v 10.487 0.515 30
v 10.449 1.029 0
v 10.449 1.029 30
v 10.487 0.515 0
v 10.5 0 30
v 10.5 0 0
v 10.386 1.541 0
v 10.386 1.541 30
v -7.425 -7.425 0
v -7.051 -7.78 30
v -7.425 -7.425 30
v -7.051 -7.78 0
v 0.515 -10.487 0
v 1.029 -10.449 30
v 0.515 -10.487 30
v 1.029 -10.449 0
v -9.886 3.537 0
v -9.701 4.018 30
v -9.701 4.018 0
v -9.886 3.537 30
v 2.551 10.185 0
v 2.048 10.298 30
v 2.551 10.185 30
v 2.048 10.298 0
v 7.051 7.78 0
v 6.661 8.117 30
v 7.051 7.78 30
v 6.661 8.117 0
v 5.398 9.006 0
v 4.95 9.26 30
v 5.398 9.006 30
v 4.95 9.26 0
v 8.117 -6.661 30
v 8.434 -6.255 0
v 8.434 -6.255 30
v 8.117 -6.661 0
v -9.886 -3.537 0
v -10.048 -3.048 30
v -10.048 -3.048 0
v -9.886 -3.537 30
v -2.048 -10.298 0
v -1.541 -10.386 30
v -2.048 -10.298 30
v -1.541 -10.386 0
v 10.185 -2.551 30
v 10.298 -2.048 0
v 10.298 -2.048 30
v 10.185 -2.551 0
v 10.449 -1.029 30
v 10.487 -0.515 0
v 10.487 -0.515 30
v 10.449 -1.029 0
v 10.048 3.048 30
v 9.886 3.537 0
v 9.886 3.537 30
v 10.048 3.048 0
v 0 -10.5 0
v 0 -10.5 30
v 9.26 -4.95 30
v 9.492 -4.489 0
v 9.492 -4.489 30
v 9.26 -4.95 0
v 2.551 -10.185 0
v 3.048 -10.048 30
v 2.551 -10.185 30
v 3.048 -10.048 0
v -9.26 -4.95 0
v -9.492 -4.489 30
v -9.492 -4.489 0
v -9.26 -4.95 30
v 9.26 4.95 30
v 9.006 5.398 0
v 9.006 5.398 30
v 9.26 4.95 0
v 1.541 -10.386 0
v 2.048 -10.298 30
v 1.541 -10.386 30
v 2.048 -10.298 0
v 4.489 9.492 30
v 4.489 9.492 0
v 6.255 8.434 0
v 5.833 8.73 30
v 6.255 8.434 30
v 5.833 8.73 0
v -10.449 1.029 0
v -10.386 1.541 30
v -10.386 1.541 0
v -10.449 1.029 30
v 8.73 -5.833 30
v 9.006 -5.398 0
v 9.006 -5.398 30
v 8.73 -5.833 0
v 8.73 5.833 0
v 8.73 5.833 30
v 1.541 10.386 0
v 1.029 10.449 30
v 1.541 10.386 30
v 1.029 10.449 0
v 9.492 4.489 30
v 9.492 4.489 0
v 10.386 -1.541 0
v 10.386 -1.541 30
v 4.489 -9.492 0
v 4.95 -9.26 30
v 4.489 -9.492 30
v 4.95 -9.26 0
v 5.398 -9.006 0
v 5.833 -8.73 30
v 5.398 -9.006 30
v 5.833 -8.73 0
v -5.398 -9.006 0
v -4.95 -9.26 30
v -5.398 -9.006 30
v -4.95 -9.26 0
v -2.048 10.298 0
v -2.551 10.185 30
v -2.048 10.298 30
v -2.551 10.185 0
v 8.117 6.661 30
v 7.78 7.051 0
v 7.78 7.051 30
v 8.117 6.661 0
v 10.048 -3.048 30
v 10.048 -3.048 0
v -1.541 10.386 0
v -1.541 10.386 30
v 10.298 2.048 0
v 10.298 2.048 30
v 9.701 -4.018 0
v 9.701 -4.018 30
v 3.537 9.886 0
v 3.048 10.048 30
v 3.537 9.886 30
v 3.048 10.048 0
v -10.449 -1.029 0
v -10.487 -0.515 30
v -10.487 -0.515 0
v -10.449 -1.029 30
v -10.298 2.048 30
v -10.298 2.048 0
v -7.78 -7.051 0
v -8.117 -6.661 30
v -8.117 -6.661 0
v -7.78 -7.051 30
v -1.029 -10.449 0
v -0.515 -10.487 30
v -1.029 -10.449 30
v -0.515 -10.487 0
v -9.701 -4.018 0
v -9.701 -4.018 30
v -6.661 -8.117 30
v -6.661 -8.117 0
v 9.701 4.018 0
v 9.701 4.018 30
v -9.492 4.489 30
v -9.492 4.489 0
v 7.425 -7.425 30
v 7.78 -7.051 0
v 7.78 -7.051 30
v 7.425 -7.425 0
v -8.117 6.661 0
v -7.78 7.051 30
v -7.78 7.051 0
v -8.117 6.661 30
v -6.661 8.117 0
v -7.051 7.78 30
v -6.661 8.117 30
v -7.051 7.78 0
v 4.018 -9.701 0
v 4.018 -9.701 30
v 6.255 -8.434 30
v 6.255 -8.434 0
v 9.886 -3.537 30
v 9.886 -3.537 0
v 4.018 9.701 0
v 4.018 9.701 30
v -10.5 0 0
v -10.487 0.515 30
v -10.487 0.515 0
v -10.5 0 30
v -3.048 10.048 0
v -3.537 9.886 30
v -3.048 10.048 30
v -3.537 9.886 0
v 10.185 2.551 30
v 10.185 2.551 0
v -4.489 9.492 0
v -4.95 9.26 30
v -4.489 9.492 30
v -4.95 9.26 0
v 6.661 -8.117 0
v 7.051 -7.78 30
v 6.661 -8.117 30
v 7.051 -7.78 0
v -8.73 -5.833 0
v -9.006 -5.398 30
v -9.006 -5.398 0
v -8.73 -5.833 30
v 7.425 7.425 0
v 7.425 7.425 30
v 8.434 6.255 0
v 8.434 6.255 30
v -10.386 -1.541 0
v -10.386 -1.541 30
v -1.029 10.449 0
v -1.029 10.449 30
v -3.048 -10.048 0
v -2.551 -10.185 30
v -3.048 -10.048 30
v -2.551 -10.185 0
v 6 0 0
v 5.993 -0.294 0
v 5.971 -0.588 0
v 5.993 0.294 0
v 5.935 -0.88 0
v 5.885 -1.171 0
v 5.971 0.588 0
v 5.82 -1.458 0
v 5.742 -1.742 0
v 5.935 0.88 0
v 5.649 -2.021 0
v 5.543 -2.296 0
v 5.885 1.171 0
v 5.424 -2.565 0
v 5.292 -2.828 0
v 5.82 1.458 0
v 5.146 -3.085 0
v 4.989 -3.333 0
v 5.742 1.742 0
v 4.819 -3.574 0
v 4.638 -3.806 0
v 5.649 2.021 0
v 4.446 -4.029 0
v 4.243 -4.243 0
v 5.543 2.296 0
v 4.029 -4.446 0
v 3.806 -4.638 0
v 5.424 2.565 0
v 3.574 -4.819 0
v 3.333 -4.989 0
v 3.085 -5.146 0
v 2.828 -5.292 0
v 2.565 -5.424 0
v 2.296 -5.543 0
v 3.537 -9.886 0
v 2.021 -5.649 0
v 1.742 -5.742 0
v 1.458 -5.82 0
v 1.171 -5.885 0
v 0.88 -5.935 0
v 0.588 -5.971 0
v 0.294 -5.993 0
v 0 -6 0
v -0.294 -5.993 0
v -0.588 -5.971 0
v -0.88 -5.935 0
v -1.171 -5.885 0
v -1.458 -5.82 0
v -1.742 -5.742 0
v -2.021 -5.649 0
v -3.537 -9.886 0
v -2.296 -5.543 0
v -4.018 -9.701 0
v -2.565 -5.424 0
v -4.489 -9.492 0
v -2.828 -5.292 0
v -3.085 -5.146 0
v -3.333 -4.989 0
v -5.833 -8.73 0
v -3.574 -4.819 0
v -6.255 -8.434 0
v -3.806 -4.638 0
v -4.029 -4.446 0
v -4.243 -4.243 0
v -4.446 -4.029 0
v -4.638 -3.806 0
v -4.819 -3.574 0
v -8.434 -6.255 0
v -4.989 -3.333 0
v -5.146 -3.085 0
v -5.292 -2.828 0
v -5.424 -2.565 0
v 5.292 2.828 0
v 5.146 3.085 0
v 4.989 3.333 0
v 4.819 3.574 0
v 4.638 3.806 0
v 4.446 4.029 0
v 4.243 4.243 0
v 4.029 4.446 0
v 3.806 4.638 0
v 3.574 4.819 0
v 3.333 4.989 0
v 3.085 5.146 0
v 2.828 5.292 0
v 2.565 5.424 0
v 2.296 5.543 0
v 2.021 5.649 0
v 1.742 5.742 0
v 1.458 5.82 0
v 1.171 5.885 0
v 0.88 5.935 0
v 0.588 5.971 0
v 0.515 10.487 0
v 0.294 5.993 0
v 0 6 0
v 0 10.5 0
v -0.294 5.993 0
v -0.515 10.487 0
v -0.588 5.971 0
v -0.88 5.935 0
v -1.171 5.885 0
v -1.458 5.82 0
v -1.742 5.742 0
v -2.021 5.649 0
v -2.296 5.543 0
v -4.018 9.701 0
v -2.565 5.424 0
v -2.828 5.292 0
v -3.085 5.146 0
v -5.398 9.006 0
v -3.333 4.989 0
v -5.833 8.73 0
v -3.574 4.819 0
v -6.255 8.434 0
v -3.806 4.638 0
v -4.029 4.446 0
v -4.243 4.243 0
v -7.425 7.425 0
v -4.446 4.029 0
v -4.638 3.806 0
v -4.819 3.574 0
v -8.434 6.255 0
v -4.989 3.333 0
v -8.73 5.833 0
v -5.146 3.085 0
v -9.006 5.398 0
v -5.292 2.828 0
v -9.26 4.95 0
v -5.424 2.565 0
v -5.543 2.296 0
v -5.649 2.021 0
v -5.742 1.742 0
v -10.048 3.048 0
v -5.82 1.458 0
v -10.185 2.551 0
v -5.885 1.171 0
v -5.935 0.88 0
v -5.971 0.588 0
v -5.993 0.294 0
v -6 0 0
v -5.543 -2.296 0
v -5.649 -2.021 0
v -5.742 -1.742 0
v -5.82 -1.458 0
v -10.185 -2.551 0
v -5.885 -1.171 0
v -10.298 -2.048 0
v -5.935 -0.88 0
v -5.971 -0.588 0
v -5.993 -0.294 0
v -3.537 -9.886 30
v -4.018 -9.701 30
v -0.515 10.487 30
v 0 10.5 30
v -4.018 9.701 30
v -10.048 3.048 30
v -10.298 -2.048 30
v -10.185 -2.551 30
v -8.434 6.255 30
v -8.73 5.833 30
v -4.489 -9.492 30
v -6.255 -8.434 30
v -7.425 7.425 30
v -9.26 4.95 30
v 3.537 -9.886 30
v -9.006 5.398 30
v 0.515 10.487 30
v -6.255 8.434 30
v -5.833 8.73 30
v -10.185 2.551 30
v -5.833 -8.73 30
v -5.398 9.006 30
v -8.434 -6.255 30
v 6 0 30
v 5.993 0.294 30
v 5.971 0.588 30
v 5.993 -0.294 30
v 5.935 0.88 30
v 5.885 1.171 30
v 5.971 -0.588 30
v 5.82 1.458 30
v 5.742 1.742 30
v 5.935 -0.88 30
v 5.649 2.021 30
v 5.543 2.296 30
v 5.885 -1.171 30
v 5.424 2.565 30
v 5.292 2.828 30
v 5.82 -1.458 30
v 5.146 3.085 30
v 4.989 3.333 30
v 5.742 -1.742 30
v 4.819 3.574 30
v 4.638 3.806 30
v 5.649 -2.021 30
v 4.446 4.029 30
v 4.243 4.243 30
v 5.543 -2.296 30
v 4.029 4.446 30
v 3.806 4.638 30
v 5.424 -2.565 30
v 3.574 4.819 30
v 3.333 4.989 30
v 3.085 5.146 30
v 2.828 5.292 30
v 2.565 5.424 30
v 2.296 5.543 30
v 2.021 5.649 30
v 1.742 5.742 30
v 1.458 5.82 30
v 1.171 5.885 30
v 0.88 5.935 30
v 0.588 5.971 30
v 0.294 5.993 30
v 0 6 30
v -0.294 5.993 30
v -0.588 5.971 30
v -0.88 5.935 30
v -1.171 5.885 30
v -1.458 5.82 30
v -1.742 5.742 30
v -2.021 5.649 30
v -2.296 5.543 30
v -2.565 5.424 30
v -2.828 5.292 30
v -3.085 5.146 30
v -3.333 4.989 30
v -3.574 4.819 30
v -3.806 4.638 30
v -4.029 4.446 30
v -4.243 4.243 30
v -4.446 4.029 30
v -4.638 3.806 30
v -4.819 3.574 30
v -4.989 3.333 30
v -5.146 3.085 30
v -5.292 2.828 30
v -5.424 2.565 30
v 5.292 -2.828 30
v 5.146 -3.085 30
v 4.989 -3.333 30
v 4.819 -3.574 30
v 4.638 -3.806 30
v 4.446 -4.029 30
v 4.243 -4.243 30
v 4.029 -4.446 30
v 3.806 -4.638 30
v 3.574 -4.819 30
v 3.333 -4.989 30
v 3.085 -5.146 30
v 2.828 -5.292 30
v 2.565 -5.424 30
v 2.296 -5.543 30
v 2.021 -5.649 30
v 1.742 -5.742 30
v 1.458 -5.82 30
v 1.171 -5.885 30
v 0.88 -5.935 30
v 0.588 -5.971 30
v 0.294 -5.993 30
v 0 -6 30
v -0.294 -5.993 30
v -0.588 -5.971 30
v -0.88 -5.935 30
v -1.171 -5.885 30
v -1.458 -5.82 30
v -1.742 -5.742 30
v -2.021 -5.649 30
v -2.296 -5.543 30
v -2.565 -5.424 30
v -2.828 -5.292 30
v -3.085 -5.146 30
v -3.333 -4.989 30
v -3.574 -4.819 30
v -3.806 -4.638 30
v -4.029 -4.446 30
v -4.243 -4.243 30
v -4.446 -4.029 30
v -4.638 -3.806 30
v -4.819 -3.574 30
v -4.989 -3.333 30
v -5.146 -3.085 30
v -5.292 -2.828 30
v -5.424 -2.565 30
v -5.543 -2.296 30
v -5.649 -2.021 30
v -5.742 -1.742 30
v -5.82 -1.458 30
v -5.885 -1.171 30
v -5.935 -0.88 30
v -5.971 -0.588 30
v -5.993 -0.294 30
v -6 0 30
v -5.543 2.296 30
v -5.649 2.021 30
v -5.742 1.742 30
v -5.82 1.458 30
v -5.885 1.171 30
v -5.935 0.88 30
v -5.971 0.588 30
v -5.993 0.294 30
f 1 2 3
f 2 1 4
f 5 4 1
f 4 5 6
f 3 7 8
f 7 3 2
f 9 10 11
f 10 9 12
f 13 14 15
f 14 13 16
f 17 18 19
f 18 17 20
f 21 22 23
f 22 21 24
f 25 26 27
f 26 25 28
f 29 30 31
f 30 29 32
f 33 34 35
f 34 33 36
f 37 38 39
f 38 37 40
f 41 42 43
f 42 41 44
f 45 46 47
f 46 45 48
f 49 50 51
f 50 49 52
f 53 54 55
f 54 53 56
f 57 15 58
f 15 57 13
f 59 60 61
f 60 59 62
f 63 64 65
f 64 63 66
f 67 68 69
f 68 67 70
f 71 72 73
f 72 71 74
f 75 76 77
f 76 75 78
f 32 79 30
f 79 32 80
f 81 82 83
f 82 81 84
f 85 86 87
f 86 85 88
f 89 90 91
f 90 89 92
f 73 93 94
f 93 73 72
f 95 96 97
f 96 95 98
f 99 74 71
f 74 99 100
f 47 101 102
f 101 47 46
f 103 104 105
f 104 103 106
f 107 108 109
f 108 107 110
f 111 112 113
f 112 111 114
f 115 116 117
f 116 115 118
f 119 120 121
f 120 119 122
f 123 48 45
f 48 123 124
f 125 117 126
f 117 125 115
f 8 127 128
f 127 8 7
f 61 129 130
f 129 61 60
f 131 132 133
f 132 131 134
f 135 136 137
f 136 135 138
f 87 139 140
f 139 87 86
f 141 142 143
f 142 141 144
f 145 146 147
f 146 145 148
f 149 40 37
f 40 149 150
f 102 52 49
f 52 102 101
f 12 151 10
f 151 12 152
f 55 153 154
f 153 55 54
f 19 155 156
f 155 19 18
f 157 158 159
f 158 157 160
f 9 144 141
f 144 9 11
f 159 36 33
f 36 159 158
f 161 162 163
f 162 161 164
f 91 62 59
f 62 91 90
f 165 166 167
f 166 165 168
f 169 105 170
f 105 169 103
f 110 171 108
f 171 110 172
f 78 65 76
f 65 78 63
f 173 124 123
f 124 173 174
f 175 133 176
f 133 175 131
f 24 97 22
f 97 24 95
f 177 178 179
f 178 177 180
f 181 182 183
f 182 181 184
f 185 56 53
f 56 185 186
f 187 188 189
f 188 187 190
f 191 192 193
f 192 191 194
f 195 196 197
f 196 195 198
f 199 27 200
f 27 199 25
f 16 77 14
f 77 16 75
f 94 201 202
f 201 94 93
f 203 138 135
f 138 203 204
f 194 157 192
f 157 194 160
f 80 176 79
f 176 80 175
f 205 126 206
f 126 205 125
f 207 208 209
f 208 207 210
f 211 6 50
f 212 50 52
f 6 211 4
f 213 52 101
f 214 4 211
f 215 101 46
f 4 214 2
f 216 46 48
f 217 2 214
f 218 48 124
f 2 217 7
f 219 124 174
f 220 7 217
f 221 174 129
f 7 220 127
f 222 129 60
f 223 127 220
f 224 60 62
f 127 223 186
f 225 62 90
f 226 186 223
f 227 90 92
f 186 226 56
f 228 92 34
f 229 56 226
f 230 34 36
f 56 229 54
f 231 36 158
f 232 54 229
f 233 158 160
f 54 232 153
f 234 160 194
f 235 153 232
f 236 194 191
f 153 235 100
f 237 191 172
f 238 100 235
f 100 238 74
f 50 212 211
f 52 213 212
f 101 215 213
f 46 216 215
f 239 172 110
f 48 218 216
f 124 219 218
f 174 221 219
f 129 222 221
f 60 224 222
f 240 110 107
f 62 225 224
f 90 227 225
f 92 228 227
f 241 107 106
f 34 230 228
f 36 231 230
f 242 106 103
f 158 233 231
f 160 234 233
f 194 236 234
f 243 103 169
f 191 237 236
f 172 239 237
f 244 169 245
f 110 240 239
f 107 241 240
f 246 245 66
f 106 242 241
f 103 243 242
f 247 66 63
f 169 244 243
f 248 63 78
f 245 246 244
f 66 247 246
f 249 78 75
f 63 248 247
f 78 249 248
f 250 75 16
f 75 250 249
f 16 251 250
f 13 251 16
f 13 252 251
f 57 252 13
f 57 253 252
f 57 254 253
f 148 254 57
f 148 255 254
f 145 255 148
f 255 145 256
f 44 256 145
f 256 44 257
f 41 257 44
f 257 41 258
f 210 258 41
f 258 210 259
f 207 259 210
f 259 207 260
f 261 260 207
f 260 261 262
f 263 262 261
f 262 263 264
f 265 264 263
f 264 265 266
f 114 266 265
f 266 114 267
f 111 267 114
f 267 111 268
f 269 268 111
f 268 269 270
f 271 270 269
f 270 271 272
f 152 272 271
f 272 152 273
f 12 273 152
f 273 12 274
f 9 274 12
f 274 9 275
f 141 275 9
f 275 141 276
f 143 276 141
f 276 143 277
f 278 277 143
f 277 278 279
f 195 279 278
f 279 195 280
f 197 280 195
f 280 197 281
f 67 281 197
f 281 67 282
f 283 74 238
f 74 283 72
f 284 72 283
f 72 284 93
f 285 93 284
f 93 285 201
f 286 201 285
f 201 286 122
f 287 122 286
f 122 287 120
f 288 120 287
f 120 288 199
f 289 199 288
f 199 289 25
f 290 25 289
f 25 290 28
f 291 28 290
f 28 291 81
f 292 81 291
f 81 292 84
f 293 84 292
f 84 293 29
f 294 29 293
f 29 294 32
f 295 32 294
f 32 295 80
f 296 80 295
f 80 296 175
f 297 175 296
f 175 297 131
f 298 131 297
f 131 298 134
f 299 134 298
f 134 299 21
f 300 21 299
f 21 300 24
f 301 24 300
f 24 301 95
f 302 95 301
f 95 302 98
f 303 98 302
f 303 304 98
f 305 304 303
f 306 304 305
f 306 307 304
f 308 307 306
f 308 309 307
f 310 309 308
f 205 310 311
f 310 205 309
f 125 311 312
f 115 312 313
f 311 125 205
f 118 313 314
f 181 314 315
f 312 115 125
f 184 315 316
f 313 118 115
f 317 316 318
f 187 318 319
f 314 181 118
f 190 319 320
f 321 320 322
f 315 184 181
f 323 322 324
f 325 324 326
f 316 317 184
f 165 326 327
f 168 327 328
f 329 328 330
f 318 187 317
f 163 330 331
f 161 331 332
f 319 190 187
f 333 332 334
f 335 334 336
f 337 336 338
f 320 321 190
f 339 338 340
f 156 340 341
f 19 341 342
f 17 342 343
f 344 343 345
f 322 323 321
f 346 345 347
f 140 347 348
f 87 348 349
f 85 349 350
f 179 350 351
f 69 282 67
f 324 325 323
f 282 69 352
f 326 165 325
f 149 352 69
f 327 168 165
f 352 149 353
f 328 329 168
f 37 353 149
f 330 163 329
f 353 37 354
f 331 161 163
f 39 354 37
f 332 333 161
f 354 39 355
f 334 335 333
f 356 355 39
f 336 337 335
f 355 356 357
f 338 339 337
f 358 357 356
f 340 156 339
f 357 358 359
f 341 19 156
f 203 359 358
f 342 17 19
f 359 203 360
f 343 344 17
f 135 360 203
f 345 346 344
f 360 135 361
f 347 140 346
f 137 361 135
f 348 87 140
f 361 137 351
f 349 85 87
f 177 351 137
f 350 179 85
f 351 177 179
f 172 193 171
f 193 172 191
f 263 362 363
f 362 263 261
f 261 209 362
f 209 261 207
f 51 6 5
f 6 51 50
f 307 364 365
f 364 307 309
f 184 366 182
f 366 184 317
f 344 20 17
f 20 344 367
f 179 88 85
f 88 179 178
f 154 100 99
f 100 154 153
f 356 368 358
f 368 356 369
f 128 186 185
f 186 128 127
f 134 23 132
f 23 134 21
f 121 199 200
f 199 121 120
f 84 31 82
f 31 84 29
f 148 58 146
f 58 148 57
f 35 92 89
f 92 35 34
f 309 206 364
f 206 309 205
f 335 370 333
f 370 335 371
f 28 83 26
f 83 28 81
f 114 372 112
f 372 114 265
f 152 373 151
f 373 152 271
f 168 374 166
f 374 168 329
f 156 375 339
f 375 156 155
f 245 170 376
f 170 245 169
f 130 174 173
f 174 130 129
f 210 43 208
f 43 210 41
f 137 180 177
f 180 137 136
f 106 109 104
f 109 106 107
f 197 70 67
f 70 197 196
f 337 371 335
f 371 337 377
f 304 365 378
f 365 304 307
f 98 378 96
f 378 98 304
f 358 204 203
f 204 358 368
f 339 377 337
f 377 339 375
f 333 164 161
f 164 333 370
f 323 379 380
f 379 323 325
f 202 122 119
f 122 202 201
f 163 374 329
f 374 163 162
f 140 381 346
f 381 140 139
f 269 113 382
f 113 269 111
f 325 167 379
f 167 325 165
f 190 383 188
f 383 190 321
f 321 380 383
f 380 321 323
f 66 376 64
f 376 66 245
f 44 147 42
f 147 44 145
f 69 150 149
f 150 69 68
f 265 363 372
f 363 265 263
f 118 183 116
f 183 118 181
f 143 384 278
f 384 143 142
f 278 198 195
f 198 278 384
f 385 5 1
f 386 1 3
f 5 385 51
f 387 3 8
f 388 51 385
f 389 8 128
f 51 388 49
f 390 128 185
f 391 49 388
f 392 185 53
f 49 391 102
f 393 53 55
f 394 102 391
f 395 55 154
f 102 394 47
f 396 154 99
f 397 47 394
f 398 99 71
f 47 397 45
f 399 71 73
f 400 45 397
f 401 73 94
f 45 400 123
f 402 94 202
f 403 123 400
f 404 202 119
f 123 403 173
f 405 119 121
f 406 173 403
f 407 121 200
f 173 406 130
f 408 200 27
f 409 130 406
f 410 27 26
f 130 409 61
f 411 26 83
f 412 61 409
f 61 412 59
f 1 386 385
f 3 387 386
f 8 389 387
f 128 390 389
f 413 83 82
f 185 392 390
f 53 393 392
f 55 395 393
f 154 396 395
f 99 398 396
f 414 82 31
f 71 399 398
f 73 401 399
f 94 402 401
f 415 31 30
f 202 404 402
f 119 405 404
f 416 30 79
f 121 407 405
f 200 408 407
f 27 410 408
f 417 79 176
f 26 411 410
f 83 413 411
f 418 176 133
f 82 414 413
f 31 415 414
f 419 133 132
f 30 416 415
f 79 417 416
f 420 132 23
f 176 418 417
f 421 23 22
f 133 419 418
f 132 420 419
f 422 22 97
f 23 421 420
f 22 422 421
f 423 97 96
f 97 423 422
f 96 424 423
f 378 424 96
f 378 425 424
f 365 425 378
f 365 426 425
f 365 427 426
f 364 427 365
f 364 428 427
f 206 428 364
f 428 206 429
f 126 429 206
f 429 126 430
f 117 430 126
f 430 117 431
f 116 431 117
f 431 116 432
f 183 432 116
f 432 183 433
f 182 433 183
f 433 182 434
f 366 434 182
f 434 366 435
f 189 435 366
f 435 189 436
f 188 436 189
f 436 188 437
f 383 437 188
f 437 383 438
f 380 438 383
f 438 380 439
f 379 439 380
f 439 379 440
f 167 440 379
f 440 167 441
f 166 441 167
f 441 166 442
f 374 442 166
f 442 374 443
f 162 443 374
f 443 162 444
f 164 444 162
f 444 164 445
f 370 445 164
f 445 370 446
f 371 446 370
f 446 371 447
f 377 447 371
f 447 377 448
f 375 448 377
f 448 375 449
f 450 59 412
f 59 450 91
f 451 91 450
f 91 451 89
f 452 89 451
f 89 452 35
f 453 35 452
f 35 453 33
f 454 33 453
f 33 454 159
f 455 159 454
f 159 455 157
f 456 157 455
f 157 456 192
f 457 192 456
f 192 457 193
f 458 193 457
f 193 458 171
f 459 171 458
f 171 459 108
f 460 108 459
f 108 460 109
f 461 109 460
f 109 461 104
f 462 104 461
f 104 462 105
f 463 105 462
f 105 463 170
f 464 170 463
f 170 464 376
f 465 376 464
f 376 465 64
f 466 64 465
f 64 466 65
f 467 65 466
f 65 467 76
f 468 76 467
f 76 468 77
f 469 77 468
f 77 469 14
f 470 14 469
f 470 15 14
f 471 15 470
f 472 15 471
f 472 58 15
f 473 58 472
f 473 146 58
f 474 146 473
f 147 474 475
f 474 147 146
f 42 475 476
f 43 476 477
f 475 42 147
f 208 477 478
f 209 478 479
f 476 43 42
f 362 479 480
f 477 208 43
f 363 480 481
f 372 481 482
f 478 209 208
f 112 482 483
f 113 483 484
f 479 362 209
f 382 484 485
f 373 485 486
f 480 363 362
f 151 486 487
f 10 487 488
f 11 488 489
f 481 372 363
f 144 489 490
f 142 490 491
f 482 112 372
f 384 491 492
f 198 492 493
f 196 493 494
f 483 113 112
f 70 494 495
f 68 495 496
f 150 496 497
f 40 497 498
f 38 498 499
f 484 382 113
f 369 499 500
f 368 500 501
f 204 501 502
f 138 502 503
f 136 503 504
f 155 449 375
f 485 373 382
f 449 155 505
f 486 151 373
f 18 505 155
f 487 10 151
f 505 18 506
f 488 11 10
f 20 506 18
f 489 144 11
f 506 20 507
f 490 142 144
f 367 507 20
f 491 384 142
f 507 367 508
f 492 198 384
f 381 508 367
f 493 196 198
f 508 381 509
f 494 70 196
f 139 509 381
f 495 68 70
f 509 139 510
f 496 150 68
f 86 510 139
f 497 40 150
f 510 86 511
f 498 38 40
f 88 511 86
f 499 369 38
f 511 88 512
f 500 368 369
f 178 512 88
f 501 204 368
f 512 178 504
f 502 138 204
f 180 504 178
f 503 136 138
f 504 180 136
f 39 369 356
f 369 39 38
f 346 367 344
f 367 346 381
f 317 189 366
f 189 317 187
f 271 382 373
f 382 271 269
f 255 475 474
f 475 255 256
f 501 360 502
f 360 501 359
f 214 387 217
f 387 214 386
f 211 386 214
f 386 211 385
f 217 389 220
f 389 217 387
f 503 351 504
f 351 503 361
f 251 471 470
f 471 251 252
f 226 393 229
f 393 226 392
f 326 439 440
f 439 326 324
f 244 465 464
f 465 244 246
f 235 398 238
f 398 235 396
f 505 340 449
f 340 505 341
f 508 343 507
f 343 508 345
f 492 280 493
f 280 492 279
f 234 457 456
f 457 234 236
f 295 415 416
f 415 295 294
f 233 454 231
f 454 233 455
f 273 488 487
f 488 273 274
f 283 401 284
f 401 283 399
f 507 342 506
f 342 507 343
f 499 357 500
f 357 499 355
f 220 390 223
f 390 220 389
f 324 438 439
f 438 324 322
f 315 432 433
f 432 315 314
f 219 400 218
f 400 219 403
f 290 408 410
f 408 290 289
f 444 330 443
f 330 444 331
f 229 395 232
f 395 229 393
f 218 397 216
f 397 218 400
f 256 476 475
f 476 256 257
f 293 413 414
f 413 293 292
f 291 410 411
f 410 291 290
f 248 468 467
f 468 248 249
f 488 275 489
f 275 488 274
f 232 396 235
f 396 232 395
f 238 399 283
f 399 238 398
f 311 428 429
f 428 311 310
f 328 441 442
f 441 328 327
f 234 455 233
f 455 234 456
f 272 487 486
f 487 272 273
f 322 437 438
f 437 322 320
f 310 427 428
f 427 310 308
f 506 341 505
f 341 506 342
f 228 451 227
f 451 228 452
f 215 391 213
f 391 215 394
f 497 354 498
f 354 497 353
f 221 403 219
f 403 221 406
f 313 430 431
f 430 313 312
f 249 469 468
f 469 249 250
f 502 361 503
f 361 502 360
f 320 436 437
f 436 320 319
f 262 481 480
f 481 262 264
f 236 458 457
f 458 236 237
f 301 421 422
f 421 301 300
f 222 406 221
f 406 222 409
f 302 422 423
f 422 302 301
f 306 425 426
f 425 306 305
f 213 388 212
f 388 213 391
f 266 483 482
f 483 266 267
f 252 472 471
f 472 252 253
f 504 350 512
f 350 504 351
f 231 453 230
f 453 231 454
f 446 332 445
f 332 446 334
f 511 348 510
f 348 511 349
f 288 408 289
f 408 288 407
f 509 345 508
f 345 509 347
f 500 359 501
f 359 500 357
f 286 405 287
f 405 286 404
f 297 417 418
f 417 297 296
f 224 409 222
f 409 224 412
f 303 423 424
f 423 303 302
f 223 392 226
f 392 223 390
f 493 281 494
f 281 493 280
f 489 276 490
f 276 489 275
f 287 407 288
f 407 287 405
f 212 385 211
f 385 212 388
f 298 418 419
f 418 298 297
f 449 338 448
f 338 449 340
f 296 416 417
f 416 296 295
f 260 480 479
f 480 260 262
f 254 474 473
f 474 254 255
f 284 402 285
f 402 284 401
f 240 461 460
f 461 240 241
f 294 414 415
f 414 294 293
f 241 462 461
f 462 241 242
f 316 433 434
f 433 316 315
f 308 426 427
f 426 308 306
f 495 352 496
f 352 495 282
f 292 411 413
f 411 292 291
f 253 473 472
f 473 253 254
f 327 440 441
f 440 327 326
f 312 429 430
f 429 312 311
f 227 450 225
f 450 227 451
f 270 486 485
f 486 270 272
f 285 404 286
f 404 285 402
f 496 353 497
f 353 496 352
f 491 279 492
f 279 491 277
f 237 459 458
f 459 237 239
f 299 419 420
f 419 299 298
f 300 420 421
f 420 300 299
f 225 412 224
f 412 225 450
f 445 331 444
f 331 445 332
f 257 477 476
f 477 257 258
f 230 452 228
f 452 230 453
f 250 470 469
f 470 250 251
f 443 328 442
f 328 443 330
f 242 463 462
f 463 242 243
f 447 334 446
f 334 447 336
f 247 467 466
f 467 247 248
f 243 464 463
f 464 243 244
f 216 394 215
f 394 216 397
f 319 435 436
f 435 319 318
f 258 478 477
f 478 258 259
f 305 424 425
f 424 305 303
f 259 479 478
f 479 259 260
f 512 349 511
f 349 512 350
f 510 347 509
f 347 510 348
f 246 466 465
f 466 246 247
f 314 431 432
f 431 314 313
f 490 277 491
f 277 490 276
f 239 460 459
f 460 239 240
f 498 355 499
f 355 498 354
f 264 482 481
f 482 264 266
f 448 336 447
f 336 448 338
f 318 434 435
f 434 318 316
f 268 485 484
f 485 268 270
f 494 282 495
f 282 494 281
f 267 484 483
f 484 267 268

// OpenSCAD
$fn = 128;

bore_d = 12.0;
od_d   = 21.0;
len    = 30.0;

difference() {
  cylinder(d = od_d, h = len, center = false);
  translate([0,0,-0.1]) cylinder(d = bore_d, h = len + 0.2, center = false);
}
